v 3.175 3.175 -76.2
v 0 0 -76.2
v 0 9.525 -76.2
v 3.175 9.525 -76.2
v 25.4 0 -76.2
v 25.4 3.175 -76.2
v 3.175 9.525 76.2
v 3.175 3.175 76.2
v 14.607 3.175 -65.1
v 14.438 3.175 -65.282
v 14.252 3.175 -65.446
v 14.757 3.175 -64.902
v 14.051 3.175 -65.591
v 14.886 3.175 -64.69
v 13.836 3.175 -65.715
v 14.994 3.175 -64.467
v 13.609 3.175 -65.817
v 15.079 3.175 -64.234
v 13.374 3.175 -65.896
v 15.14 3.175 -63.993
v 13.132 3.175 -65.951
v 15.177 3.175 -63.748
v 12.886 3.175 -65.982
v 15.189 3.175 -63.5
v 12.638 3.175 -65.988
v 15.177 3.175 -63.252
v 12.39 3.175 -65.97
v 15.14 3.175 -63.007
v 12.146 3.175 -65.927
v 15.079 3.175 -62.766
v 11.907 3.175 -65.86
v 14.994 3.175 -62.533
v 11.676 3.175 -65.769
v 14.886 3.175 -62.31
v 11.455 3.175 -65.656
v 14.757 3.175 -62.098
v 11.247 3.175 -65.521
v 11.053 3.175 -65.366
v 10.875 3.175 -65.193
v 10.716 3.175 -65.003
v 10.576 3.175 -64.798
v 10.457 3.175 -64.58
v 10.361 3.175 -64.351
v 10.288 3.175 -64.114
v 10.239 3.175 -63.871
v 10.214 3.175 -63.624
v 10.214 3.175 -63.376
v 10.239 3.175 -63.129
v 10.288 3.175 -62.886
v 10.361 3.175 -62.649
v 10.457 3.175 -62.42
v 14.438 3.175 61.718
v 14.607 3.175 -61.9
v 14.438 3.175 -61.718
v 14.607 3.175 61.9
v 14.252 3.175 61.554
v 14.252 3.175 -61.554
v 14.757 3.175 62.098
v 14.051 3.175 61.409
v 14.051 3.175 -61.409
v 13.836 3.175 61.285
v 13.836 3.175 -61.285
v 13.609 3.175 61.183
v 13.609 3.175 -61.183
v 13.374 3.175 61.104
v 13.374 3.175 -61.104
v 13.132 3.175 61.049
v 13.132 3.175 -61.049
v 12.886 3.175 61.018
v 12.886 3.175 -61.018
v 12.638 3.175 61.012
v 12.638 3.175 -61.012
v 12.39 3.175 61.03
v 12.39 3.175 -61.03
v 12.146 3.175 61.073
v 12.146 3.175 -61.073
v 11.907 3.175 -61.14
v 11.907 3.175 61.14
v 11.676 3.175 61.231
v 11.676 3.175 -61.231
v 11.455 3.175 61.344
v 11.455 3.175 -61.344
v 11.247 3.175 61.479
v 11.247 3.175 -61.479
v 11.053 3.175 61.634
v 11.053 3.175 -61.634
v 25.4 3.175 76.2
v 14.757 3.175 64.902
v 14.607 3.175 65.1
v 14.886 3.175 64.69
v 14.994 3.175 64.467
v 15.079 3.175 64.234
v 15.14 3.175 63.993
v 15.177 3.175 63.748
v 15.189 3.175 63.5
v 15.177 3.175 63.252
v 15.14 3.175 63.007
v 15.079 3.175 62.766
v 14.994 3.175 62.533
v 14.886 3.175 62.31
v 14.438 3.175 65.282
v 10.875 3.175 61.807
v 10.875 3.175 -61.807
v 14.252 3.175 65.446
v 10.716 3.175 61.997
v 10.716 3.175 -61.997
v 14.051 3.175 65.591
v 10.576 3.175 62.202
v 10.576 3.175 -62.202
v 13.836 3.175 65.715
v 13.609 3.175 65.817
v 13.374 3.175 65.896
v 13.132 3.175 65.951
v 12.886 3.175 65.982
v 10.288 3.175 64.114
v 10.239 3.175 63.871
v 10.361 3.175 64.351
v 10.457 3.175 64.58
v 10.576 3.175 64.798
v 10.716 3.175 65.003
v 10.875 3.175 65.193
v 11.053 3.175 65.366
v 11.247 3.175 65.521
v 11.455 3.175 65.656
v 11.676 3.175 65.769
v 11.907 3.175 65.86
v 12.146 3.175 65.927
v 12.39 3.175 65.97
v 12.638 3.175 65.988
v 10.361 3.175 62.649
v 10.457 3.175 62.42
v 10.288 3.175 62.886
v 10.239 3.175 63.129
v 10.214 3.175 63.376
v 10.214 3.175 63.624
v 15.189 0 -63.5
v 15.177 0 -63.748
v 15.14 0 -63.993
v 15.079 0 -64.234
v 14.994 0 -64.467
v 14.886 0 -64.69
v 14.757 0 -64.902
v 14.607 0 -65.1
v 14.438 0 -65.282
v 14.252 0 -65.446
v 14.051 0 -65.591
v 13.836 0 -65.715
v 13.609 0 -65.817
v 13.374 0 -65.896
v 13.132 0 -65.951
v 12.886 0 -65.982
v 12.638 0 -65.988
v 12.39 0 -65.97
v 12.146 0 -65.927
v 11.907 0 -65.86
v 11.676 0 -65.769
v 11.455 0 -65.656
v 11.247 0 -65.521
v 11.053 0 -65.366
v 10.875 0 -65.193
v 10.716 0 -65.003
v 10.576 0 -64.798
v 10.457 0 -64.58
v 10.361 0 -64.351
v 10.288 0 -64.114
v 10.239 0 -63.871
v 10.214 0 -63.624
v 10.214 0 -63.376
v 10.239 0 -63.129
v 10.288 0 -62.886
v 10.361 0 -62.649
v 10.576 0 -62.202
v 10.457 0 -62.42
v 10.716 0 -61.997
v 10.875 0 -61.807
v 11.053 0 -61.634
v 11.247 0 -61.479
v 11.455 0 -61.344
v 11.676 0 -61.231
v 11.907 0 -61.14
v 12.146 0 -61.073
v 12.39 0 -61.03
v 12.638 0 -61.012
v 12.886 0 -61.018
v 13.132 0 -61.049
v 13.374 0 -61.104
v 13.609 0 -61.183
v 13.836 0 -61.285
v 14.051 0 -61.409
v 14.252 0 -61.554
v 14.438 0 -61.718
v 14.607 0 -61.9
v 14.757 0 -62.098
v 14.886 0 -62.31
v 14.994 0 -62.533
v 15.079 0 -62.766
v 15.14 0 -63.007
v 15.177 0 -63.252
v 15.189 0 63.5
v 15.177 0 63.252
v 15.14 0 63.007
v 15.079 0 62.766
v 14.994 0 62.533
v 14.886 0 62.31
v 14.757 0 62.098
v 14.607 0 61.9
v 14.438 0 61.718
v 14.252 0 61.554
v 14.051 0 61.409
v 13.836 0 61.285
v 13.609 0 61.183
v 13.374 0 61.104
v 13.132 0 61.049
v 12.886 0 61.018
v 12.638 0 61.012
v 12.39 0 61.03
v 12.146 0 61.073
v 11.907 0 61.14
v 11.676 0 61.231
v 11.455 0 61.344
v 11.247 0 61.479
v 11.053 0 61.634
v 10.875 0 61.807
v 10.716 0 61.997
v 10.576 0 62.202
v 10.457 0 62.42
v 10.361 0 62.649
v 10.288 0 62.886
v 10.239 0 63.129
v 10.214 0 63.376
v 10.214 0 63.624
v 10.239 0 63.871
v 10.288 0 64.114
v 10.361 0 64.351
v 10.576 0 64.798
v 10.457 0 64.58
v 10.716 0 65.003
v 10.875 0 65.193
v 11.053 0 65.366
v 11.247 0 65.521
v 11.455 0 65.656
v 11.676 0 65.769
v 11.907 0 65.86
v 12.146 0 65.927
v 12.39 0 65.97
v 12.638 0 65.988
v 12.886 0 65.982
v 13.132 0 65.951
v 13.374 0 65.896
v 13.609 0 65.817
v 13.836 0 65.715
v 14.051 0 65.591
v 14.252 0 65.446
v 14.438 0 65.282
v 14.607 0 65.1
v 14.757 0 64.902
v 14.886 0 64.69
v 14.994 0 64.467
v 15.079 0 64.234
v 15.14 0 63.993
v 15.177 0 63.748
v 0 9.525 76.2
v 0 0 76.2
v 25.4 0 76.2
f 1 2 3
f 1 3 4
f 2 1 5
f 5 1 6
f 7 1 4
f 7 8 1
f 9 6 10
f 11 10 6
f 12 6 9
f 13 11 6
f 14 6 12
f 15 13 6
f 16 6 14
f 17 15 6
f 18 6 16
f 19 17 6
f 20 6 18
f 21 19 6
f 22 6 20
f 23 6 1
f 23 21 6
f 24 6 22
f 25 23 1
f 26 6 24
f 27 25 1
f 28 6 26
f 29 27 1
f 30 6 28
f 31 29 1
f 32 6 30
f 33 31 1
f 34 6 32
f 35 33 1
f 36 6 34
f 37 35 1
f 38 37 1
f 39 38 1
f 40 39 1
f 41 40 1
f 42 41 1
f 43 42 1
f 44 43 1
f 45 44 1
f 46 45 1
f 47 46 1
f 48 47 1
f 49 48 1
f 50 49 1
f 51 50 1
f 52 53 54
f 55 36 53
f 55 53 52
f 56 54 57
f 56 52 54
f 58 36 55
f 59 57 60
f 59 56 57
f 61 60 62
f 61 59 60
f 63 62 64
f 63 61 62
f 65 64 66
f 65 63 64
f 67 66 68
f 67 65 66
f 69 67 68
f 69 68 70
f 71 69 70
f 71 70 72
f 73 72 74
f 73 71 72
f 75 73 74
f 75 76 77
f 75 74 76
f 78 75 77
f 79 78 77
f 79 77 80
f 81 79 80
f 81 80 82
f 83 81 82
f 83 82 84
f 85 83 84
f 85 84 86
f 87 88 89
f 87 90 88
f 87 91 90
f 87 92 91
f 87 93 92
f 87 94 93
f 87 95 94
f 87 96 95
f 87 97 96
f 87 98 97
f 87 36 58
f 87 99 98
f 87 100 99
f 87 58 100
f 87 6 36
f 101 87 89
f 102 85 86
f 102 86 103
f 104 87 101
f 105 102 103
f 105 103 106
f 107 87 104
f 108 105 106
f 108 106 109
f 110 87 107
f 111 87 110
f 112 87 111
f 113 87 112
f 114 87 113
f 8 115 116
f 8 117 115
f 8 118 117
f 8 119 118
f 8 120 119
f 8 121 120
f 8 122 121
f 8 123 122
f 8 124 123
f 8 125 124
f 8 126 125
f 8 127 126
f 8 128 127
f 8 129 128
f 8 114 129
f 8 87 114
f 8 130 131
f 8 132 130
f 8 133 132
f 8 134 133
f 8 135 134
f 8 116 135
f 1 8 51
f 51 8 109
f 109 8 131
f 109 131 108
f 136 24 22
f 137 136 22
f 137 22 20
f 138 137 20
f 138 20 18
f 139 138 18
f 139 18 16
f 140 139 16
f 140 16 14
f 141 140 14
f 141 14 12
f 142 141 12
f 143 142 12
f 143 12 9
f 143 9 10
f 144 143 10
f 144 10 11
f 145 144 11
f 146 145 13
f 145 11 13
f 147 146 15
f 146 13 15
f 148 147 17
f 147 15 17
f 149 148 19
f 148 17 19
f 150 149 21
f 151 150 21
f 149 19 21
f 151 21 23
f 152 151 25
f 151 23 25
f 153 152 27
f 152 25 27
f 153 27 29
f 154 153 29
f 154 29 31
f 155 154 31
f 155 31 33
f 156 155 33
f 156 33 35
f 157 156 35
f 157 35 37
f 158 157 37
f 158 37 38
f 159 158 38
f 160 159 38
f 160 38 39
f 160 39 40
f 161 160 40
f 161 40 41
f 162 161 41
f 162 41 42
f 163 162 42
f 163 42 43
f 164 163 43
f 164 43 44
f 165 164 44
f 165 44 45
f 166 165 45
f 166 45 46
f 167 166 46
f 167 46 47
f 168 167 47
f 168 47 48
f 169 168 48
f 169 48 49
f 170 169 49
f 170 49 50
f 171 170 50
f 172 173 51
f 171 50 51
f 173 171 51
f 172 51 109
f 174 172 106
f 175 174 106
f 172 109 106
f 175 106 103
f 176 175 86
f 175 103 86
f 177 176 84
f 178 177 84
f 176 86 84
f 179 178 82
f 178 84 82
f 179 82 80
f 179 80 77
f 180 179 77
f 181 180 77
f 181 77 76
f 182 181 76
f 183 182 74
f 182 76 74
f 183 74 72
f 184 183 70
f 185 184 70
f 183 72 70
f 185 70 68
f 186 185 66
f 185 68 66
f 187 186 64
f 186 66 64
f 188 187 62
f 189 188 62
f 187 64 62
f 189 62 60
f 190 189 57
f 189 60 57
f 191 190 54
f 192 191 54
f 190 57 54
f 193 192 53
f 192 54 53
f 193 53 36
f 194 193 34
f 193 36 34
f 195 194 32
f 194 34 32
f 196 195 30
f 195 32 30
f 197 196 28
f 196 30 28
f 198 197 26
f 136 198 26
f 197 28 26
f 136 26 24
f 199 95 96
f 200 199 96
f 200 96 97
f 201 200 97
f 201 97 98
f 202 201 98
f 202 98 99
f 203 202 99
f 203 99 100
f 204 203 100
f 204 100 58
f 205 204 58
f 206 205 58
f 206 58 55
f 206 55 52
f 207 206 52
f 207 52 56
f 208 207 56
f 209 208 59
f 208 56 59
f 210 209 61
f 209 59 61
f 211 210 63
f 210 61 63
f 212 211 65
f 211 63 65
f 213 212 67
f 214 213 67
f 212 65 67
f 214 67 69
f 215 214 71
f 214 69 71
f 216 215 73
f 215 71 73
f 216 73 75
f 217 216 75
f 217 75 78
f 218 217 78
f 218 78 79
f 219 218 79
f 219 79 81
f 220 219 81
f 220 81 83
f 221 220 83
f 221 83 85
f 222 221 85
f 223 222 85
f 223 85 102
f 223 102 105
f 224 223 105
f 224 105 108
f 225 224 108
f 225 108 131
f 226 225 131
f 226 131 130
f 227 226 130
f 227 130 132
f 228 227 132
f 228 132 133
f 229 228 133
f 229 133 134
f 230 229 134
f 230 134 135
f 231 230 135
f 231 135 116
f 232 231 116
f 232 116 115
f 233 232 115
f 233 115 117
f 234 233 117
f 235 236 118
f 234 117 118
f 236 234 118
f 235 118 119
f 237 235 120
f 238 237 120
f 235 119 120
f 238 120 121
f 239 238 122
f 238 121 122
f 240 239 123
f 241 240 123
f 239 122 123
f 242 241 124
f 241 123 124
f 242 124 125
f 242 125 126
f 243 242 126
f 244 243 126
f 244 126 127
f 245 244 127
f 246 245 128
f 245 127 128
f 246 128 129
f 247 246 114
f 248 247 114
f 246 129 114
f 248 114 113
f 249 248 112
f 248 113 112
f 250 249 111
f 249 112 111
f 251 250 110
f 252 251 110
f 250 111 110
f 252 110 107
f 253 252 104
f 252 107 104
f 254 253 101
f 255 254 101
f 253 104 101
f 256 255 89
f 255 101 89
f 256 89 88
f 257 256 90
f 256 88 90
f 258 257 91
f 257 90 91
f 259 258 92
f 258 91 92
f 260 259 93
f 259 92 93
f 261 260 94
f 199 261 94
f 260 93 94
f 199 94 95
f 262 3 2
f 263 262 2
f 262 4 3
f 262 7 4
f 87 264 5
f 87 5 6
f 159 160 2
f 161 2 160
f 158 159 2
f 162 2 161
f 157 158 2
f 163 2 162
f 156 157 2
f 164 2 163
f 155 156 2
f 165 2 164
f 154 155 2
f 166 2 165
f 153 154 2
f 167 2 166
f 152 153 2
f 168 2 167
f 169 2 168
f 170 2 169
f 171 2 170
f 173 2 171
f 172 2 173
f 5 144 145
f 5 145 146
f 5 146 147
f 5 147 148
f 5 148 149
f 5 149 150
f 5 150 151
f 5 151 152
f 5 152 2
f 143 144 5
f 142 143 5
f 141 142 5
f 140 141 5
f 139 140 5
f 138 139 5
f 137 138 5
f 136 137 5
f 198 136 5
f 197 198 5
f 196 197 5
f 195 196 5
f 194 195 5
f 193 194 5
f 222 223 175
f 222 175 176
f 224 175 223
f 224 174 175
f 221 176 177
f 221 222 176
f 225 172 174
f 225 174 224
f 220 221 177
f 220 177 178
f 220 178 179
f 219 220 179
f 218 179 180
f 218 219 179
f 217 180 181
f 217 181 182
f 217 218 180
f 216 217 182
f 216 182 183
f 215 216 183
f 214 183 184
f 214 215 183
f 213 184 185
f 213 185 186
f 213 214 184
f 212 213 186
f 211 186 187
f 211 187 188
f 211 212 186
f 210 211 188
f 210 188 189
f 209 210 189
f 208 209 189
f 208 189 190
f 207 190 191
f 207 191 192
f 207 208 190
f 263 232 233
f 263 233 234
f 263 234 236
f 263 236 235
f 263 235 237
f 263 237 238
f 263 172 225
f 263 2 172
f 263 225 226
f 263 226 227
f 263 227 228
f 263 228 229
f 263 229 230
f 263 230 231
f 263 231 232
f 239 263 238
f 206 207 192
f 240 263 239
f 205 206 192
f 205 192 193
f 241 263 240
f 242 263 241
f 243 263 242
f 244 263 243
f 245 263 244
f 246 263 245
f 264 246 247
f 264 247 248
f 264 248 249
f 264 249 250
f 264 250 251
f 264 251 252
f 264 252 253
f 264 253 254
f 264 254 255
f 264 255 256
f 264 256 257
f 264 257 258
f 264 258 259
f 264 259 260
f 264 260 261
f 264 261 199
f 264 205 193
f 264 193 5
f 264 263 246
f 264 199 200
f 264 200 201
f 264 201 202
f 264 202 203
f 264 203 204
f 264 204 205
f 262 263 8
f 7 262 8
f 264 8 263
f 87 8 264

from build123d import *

# Parameters (mm, degrees)
BOSS_EXTRUDE1_DEPTH = 76.2
SKETCH2_R           = 2.4892
CUT_EXTRUDE1_DEPTH  = 4.175


with BuildPart() as part:
    # Sketch1 → Boss-Extrude1 (new body, symmetric)
    with BuildSketch(Plane.XY):
        Polygon((0, 9.525), (0, 0), (25.4, 0), (25.4, 3.175), (3.175, 3.175), (3.175, 9.525), align=None)
    extrude(amount=BOSS_EXTRUDE1_DEPTH, both=True)

    # Sketch2 → Cut-Extrude1 (cut, through all)
    with BuildSketch(Plane(origin=(0, 3.175, 0), x_dir=(1, 0, 0), z_dir=(0, 1, 0))):
        with Locations((12.7, -63.5)):
            Circle(SKETCH2_R)
        with Locations((12.7, 63.5)):
            Circle(SKETCH2_R)
    extrude(amount=-CUT_EXTRUDE1_DEPTH, mode=Mode.SUBTRACT)


solid = part.part
